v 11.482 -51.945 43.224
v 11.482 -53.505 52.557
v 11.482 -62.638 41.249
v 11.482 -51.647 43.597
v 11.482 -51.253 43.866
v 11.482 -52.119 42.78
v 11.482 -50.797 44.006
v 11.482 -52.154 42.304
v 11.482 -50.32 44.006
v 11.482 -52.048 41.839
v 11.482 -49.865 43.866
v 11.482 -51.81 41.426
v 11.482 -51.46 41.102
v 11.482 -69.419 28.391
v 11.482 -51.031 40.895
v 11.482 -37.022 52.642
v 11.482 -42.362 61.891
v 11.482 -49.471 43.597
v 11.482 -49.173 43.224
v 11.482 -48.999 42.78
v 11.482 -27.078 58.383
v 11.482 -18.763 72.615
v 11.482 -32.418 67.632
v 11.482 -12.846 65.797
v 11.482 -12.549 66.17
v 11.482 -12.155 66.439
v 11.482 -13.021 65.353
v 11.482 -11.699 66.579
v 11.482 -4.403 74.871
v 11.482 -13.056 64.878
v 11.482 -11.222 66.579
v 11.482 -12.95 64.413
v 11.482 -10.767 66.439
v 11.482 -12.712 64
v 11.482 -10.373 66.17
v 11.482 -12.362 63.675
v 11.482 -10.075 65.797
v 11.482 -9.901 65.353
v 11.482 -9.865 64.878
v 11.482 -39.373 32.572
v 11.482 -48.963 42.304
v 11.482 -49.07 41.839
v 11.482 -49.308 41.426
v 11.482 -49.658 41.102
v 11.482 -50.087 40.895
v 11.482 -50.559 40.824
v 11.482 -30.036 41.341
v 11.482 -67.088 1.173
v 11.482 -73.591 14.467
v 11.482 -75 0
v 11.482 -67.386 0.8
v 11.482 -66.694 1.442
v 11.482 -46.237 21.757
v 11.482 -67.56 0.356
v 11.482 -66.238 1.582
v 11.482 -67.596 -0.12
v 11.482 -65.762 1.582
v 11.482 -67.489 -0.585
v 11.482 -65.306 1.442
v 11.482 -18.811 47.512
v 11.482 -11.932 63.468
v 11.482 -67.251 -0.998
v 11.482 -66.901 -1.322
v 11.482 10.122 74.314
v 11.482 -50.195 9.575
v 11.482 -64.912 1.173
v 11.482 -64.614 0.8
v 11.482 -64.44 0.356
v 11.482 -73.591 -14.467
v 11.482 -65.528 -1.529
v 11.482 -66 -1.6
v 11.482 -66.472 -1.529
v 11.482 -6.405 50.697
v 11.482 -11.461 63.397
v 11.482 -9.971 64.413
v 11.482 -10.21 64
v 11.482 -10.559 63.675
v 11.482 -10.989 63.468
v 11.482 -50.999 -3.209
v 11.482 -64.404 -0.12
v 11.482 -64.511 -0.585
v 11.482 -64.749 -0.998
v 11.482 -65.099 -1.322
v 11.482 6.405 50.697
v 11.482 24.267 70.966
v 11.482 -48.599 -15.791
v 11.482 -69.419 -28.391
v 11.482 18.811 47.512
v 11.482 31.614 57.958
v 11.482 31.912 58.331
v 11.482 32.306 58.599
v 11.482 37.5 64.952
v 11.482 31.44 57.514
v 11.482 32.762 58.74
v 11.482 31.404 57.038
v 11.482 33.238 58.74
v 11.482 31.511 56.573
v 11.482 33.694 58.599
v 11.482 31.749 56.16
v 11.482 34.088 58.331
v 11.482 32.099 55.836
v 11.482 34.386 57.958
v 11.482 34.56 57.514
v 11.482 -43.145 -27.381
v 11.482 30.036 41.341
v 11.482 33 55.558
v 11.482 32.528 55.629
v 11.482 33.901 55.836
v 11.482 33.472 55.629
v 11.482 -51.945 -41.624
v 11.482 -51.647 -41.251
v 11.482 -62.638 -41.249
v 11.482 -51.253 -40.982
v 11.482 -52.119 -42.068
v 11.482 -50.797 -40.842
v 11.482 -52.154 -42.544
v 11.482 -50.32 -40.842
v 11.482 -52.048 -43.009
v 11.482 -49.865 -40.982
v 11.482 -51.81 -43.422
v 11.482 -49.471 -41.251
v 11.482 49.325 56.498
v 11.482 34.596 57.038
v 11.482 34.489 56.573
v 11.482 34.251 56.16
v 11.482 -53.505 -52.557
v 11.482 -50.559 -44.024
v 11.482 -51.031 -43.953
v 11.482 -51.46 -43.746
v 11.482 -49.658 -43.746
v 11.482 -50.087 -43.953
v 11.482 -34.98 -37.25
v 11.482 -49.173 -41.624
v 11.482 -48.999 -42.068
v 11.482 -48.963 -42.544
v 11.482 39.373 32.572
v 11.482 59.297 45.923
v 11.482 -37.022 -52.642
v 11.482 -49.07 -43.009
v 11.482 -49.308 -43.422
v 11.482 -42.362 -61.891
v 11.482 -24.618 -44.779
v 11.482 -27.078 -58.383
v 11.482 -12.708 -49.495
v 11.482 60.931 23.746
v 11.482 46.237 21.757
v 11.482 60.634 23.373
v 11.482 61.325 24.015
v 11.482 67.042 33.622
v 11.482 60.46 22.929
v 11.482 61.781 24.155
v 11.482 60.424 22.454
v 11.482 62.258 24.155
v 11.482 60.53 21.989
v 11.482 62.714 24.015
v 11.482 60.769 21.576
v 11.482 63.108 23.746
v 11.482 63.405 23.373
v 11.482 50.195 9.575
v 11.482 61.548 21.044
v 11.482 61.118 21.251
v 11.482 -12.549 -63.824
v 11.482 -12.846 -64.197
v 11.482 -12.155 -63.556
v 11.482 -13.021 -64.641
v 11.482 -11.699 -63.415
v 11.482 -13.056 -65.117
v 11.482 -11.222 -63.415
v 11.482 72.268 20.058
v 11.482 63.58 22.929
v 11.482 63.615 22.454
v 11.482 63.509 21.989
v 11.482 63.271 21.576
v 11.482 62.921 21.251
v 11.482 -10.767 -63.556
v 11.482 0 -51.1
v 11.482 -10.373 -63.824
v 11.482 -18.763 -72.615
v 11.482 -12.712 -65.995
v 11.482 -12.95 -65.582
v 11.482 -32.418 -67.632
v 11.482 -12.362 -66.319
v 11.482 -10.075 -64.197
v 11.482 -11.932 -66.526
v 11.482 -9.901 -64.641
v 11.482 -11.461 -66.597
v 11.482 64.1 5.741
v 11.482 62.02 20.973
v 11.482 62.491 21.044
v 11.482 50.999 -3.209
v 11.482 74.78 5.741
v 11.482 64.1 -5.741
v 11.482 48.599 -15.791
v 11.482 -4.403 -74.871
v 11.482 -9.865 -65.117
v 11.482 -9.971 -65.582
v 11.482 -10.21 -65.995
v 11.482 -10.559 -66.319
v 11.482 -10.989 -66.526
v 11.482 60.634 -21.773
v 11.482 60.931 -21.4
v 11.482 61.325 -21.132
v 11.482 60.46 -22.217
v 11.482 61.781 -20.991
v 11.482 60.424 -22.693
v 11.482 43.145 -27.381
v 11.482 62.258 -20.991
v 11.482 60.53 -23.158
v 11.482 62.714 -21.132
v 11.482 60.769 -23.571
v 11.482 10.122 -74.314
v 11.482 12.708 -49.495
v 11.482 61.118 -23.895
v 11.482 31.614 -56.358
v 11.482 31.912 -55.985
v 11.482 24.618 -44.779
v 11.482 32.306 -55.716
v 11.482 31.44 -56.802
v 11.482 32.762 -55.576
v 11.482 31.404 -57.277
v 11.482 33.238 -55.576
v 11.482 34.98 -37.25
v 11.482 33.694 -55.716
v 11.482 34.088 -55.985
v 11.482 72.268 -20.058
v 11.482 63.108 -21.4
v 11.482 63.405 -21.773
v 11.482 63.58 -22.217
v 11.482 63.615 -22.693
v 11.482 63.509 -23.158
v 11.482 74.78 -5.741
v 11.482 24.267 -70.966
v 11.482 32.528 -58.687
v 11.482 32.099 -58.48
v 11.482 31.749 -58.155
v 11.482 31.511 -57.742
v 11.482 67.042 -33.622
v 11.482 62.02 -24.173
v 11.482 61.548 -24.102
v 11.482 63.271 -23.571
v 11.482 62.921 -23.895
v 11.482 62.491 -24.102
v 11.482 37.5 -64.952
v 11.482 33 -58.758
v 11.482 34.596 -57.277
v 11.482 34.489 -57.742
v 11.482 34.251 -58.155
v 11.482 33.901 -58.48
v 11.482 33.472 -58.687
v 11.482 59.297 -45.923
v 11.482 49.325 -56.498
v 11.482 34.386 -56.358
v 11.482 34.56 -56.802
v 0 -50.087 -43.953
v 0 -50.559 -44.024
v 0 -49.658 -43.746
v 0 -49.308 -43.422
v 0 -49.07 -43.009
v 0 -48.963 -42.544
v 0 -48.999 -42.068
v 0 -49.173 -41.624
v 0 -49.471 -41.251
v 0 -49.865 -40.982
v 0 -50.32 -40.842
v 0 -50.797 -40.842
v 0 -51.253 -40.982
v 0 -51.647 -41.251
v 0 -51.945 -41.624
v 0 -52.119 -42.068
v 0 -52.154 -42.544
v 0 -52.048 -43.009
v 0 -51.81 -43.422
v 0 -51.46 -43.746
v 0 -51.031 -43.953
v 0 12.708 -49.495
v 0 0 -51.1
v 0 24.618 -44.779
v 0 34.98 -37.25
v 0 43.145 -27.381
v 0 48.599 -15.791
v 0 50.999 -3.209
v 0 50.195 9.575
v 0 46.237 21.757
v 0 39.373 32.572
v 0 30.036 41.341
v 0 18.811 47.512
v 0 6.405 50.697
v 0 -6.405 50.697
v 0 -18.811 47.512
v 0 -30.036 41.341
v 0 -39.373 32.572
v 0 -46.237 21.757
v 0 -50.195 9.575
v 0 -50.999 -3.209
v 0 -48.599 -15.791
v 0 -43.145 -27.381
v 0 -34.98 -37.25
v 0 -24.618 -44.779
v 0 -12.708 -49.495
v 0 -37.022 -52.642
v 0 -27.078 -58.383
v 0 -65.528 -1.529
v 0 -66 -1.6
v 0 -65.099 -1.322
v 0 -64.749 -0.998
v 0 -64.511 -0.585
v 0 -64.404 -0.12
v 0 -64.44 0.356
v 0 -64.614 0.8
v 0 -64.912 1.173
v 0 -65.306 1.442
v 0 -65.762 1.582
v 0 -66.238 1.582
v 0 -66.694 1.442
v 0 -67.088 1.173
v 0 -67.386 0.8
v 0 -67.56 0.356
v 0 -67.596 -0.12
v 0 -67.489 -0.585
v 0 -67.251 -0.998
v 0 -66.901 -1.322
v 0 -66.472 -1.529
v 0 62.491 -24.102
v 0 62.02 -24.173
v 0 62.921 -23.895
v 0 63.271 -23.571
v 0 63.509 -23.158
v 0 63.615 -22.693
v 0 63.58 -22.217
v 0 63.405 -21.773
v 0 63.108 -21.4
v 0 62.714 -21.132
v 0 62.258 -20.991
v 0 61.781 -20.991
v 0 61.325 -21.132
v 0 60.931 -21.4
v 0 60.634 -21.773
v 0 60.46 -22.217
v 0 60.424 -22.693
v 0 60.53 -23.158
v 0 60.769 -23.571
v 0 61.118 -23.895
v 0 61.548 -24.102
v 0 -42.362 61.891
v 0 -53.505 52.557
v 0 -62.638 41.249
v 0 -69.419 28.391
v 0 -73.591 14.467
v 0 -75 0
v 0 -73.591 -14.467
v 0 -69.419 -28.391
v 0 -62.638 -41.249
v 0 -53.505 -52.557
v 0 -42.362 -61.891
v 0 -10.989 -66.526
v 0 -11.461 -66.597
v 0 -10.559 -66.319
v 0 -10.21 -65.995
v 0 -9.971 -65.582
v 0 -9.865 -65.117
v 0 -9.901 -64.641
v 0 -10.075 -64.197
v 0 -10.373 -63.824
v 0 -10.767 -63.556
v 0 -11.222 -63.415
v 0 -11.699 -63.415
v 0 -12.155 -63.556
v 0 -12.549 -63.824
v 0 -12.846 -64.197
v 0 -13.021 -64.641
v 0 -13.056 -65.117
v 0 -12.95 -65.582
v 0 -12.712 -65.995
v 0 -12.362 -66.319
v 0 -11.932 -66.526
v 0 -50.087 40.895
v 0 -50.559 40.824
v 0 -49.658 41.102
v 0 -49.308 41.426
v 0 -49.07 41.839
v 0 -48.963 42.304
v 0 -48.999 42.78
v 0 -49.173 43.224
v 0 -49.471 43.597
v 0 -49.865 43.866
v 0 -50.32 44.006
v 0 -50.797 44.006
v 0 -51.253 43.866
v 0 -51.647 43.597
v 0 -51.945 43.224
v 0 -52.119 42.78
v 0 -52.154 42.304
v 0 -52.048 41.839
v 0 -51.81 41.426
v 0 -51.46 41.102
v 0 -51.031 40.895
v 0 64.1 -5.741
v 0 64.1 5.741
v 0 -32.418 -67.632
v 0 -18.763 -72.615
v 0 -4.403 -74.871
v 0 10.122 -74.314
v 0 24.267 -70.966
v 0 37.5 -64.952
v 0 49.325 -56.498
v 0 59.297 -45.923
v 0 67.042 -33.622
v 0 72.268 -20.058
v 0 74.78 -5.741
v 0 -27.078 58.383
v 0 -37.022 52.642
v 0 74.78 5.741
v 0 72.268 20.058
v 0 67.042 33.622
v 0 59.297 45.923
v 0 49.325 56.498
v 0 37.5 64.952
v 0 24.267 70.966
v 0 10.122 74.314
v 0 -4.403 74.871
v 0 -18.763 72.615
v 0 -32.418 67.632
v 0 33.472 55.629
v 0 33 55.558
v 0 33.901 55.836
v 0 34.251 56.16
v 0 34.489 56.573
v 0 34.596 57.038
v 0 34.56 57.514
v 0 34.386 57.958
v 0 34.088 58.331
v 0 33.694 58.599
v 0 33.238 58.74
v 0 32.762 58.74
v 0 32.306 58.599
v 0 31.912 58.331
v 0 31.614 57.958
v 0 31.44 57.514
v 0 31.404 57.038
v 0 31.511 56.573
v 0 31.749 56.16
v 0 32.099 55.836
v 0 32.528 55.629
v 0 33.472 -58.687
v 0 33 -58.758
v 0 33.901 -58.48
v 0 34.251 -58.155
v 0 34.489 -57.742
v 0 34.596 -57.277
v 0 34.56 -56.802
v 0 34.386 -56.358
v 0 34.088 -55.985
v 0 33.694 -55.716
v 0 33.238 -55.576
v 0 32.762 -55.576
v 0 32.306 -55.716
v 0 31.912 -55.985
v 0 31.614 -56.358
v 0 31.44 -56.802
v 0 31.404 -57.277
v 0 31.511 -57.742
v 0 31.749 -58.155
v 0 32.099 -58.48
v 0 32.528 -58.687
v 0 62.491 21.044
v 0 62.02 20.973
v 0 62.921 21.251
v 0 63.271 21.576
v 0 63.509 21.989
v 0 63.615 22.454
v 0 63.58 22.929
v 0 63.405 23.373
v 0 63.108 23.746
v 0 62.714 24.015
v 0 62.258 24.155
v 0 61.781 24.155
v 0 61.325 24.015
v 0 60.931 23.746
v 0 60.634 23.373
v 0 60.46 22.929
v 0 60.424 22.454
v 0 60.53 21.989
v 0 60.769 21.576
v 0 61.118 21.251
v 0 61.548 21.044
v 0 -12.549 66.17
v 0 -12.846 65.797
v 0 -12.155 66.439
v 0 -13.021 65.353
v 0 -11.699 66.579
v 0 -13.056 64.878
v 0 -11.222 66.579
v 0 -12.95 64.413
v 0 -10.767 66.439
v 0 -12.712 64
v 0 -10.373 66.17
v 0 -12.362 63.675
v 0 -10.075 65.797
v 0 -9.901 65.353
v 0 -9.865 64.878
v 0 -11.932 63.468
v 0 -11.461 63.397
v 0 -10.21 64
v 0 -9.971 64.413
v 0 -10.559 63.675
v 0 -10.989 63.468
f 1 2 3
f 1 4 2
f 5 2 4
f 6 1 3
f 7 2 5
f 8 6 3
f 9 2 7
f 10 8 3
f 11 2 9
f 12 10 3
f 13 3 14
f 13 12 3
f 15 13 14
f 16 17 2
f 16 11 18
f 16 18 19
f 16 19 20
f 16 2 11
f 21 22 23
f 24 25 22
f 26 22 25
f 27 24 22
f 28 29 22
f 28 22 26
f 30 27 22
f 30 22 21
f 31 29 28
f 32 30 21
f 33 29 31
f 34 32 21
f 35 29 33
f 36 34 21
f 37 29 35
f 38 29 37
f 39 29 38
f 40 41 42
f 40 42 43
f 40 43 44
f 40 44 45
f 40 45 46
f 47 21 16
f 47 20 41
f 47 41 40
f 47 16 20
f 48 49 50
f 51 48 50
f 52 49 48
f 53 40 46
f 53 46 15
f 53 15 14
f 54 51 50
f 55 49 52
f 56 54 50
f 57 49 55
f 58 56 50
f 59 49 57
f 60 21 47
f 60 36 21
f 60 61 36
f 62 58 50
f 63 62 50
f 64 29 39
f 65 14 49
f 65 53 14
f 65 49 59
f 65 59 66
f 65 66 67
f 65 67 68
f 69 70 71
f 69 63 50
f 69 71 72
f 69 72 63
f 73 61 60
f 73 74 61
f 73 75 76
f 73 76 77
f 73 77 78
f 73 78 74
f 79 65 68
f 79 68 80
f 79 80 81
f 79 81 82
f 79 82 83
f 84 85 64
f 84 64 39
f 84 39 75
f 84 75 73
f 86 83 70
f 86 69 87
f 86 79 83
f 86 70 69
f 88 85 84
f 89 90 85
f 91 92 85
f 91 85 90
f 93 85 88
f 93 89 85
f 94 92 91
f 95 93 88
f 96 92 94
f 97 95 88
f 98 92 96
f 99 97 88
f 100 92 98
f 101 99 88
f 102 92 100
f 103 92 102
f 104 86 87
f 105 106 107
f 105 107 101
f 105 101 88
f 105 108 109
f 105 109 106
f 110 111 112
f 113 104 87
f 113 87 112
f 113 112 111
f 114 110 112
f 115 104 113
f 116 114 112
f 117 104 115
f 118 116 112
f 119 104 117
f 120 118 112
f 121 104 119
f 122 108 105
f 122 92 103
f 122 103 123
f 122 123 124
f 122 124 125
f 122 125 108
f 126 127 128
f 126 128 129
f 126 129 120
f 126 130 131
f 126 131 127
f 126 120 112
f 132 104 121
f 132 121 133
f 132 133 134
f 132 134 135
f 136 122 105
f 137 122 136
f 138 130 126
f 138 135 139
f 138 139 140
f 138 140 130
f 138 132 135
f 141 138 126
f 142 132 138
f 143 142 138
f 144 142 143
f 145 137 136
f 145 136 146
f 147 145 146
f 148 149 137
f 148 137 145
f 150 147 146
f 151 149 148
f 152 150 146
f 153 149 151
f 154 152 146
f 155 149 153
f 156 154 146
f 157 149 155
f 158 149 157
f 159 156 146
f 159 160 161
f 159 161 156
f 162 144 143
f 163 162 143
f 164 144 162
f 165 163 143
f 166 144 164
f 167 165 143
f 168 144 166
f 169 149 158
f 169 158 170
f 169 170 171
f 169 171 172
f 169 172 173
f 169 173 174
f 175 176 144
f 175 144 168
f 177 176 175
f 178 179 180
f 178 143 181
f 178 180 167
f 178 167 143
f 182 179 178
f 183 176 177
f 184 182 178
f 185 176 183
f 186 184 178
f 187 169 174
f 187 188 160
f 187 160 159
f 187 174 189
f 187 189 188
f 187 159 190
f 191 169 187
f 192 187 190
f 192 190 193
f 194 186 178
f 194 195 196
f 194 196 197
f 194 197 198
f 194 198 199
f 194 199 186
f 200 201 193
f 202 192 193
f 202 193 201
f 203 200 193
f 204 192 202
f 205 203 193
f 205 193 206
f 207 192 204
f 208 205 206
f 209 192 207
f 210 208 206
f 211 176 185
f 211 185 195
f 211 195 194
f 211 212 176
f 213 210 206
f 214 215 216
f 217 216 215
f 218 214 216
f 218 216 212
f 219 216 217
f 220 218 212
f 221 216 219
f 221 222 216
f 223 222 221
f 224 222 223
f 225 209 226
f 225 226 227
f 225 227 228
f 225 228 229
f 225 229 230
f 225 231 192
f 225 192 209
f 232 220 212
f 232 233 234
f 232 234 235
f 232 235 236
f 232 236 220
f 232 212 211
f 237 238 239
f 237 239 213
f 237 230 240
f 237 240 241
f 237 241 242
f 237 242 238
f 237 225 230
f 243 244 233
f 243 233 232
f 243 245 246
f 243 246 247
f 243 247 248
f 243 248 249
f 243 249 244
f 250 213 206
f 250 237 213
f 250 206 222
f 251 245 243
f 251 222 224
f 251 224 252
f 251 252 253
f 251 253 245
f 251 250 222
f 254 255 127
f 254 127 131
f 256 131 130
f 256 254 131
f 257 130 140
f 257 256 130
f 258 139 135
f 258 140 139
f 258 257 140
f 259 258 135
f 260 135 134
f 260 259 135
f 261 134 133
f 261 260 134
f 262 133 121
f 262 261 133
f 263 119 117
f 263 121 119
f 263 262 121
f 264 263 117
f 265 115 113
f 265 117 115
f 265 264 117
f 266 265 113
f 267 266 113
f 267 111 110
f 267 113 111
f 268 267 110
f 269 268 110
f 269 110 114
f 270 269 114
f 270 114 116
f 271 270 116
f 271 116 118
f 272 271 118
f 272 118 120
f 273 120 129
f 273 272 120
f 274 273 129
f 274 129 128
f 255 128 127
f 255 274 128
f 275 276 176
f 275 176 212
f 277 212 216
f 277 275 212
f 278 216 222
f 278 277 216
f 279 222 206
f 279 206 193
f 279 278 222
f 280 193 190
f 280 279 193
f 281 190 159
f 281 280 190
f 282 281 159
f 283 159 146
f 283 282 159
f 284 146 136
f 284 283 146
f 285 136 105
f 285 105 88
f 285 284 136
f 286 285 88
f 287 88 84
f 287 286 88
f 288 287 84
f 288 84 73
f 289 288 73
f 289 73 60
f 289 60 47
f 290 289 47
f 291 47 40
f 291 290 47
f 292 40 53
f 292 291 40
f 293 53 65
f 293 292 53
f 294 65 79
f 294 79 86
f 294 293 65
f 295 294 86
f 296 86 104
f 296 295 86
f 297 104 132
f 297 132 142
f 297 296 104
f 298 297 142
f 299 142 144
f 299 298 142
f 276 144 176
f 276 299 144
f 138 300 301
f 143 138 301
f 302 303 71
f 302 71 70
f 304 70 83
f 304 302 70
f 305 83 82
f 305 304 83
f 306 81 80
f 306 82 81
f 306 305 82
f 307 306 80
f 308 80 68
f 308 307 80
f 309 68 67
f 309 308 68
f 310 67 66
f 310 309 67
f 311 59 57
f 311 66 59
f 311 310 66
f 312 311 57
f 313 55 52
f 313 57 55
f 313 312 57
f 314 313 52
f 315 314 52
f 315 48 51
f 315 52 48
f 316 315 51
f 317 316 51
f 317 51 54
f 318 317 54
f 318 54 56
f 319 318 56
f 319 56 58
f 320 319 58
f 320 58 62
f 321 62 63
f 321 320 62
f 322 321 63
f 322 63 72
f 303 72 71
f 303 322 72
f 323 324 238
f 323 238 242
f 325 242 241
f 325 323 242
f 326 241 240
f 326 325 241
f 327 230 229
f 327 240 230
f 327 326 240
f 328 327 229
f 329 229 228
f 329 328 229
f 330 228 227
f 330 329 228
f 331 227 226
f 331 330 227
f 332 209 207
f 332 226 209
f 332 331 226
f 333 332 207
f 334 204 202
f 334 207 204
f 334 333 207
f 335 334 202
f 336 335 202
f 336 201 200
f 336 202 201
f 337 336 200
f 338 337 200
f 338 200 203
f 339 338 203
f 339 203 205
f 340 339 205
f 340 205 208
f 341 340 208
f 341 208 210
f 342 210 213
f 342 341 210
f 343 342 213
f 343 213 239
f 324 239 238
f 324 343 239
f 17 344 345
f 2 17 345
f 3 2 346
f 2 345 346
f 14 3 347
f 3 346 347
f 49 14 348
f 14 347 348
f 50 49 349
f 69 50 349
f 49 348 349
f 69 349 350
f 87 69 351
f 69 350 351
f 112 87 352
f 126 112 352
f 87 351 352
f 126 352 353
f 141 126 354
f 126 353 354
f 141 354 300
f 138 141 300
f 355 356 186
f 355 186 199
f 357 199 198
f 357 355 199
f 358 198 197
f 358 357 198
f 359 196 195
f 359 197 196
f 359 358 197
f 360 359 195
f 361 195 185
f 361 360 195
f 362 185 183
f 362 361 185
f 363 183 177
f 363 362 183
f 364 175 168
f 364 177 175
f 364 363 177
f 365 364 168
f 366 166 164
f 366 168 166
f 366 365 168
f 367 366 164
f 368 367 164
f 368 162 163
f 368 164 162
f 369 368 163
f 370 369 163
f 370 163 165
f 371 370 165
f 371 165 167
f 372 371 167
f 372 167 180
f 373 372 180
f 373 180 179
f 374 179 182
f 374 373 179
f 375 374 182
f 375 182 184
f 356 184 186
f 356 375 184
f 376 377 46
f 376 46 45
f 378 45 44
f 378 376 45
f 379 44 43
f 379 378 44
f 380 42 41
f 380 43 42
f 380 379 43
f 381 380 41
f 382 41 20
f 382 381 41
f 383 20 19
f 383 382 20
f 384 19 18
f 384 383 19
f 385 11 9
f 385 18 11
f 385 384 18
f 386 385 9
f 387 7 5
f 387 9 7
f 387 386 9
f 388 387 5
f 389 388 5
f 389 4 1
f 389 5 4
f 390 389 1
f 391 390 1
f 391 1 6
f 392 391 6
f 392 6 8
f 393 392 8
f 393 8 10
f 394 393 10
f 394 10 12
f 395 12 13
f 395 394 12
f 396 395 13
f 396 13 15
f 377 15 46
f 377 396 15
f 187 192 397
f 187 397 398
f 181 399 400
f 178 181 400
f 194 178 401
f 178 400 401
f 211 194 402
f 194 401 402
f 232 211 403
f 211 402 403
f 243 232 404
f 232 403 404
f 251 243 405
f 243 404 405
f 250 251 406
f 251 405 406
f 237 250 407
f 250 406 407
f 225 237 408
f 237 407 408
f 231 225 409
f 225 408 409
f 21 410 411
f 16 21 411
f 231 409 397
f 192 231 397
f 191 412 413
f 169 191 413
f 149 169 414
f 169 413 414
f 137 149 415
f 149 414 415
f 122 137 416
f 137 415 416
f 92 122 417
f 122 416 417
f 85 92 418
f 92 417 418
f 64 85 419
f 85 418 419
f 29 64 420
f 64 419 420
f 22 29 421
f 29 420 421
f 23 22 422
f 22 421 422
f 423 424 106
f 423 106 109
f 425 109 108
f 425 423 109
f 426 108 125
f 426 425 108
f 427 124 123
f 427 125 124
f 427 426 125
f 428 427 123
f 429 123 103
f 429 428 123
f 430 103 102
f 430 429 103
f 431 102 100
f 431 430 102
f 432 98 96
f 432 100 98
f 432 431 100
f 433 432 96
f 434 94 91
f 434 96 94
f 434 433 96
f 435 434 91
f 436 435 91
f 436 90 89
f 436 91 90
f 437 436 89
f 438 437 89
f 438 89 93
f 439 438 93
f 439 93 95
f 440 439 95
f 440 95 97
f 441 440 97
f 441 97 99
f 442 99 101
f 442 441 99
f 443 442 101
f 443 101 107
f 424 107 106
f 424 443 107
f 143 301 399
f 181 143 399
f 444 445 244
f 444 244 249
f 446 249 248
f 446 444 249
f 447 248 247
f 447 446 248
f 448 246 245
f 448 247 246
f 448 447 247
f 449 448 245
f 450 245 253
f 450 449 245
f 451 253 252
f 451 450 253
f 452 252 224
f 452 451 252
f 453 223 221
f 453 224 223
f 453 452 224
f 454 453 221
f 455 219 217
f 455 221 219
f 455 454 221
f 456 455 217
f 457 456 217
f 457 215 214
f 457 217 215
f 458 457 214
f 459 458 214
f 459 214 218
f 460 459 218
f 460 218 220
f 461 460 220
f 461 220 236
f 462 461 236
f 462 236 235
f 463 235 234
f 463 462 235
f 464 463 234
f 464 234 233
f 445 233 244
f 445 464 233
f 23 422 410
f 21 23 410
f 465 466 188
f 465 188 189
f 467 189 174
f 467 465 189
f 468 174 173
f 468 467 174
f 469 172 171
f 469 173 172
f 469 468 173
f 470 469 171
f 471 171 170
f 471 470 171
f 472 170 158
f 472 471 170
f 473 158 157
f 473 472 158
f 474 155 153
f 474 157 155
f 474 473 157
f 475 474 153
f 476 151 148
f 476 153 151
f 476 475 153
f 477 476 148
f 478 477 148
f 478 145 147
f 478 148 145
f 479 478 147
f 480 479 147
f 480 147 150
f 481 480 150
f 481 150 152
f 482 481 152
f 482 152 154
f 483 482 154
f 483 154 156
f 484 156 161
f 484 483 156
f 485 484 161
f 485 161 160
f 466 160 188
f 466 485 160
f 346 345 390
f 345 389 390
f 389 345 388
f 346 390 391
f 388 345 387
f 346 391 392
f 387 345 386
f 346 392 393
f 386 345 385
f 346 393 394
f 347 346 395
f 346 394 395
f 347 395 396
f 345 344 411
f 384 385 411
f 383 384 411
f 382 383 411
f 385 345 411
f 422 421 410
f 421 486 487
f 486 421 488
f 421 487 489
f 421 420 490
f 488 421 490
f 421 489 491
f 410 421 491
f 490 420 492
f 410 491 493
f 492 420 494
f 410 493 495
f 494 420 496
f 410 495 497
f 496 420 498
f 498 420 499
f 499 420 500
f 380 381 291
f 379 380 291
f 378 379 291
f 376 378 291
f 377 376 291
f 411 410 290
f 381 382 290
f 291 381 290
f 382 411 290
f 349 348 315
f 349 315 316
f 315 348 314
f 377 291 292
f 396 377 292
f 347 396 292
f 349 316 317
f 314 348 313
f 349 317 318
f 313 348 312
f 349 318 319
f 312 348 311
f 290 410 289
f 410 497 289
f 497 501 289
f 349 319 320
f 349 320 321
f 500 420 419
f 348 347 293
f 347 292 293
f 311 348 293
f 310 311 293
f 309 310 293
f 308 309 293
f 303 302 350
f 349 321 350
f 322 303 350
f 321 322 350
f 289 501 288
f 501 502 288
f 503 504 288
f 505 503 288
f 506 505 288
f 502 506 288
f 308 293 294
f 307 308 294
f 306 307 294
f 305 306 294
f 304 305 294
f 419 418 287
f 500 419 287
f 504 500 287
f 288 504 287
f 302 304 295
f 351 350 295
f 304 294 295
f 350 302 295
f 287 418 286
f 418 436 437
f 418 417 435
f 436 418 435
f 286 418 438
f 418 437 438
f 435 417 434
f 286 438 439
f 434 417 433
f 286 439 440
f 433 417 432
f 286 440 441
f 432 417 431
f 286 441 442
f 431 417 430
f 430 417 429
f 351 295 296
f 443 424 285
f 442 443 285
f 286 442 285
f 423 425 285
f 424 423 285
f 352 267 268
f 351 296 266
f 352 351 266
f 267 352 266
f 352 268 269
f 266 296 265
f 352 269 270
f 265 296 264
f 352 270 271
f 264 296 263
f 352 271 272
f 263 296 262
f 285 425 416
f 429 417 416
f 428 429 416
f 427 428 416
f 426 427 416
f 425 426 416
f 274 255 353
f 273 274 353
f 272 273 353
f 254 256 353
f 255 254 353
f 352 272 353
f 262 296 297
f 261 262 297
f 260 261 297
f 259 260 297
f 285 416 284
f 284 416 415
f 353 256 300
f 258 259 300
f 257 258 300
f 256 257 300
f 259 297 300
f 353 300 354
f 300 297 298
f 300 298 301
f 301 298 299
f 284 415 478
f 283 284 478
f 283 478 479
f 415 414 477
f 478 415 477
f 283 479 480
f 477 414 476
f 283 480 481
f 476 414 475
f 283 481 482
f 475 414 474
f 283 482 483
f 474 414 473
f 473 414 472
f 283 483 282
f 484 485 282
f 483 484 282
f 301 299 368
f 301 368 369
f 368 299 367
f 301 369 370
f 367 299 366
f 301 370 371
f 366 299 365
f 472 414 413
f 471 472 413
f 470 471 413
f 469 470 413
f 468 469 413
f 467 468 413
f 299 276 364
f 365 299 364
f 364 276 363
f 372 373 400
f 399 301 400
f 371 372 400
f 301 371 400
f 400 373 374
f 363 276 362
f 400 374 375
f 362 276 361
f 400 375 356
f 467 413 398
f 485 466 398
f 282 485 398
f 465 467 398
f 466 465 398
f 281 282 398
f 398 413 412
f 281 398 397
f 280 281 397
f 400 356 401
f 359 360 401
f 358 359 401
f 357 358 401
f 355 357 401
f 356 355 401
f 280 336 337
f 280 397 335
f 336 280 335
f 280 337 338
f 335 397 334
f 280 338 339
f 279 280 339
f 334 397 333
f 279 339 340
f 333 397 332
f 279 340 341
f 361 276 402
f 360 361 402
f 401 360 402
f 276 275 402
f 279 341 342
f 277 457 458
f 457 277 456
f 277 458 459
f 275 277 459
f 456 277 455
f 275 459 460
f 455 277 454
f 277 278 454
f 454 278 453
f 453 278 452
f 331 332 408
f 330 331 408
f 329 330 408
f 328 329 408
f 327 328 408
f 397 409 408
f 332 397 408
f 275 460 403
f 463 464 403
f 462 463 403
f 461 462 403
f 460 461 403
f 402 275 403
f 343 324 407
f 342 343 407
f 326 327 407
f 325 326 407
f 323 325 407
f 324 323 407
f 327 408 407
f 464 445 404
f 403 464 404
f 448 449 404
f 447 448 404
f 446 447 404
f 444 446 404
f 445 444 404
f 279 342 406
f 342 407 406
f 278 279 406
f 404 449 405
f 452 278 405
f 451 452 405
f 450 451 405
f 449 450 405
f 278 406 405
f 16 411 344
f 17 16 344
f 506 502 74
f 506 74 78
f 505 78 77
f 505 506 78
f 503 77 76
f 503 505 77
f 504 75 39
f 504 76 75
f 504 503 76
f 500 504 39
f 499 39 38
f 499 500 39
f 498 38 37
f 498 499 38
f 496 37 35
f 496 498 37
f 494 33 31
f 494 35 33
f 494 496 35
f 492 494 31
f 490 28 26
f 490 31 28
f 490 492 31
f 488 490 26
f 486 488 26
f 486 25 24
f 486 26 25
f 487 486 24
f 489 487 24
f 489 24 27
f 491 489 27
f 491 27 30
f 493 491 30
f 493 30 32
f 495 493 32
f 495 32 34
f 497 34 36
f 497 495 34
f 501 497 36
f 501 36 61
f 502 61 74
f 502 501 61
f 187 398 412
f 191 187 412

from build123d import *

# Parameters (mm, degrees)
ESQUISSE1_R             = 51.1
BOSS_EXTRU_1_DEPTH      = 11.482
CUT_EXTRUDE1_DEPTH      = 107.685689406
CUT_EXTRUDE1_DEPTH_BACK = 107.685689406
SKETCH1_R               = 1.6


with BuildPart() as part:
    # Esquisse1 → Boss.-Extru.1 (new body)
    with BuildSketch(Plane(origin=(0, 0, 0), x_dir=(0, 0, -1), z_dir=(1, 0, 0))):
        with BuildLine():
            Line((-5.741, 64.1), (-5.741, 74.77994998))
            ThreePointArc((-5.741, 74.77994998), (-64.951905284, 37.5), (-67.631836376, -32.418123147))
            Line((-67.631836376, -32.418123147), (-58.382728383, -27.078148157))
            Line((-58.382728383, -27.078148157), (-52.641728383, -37.021851843))
            Line((-52.641728383, -37.021851843), (-61.890836376, -42.361826833))
            ThreePointArc((-61.890836376, -42.361826833), (0, -75), (61.890836376, -42.361826833))
            Line((61.890836376, -42.361826833), (52.641728383, -37.021851843))
            Line((52.641728383, -37.021851843), (58.382728383, -27.078148157))
            Line((58.382728383, -27.078148157), (67.631836376, -32.418123147))
            ThreePointArc((67.631836376, -32.418123147), (64.951905284, 37.5), (5.741, 74.77994998))
            Line((5.741, 74.77994998), (5.741, 64.1))
            Line((5.741, 64.1), (-5.741, 64.1))
        make_face()
        Circle(ESQUISSE1_R, mode=Mode.SUBTRACT)
    extrude(amount=BOSS_EXTRU_1_DEPTH)

    # Sketch1 → Cut-Extrude1 (cut, two sides: drawn at the far end of the back side and taken through both)
    with BuildSketch(Plane(origin=(0, 0, 0), x_dir=(0, 0, -1), z_dir=(1, 0, 0)).offset(-CUT_EXTRUDE1_DEPTH_BACK)):
        with Locations((22.573329459, 62.019712972)):
            Circle(SKETCH1_R)
        with Locations((57.15767665, 33)):
            Circle(SKETCH1_R)
        with Locations((64.997311699, -11.460779726)):
            Circle(SKETCH1_R)
        with Locations((42.423982239, -50.558933246)):
            Circle(SKETCH1_R)
        with Locations((0, -66)):
            Circle(SKETCH1_R)
        with Locations((-42.423982239, -50.558933246)):
            Circle(SKETCH1_R)
        with Locations((-64.997311699, -11.460779726)):
            Circle(SKETCH1_R)
        with Locations((-57.15767665, 33)):
            Circle(SKETCH1_R)
        with Locations((-22.573329459, 62.019712972)):
            Circle(SKETCH1_R)
    extrude(amount=CUT_EXTRUDE1_DEPTH + CUT_EXTRUDE1_DEPTH_BACK, mode=Mode.SUBTRACT)


solid = part.part
